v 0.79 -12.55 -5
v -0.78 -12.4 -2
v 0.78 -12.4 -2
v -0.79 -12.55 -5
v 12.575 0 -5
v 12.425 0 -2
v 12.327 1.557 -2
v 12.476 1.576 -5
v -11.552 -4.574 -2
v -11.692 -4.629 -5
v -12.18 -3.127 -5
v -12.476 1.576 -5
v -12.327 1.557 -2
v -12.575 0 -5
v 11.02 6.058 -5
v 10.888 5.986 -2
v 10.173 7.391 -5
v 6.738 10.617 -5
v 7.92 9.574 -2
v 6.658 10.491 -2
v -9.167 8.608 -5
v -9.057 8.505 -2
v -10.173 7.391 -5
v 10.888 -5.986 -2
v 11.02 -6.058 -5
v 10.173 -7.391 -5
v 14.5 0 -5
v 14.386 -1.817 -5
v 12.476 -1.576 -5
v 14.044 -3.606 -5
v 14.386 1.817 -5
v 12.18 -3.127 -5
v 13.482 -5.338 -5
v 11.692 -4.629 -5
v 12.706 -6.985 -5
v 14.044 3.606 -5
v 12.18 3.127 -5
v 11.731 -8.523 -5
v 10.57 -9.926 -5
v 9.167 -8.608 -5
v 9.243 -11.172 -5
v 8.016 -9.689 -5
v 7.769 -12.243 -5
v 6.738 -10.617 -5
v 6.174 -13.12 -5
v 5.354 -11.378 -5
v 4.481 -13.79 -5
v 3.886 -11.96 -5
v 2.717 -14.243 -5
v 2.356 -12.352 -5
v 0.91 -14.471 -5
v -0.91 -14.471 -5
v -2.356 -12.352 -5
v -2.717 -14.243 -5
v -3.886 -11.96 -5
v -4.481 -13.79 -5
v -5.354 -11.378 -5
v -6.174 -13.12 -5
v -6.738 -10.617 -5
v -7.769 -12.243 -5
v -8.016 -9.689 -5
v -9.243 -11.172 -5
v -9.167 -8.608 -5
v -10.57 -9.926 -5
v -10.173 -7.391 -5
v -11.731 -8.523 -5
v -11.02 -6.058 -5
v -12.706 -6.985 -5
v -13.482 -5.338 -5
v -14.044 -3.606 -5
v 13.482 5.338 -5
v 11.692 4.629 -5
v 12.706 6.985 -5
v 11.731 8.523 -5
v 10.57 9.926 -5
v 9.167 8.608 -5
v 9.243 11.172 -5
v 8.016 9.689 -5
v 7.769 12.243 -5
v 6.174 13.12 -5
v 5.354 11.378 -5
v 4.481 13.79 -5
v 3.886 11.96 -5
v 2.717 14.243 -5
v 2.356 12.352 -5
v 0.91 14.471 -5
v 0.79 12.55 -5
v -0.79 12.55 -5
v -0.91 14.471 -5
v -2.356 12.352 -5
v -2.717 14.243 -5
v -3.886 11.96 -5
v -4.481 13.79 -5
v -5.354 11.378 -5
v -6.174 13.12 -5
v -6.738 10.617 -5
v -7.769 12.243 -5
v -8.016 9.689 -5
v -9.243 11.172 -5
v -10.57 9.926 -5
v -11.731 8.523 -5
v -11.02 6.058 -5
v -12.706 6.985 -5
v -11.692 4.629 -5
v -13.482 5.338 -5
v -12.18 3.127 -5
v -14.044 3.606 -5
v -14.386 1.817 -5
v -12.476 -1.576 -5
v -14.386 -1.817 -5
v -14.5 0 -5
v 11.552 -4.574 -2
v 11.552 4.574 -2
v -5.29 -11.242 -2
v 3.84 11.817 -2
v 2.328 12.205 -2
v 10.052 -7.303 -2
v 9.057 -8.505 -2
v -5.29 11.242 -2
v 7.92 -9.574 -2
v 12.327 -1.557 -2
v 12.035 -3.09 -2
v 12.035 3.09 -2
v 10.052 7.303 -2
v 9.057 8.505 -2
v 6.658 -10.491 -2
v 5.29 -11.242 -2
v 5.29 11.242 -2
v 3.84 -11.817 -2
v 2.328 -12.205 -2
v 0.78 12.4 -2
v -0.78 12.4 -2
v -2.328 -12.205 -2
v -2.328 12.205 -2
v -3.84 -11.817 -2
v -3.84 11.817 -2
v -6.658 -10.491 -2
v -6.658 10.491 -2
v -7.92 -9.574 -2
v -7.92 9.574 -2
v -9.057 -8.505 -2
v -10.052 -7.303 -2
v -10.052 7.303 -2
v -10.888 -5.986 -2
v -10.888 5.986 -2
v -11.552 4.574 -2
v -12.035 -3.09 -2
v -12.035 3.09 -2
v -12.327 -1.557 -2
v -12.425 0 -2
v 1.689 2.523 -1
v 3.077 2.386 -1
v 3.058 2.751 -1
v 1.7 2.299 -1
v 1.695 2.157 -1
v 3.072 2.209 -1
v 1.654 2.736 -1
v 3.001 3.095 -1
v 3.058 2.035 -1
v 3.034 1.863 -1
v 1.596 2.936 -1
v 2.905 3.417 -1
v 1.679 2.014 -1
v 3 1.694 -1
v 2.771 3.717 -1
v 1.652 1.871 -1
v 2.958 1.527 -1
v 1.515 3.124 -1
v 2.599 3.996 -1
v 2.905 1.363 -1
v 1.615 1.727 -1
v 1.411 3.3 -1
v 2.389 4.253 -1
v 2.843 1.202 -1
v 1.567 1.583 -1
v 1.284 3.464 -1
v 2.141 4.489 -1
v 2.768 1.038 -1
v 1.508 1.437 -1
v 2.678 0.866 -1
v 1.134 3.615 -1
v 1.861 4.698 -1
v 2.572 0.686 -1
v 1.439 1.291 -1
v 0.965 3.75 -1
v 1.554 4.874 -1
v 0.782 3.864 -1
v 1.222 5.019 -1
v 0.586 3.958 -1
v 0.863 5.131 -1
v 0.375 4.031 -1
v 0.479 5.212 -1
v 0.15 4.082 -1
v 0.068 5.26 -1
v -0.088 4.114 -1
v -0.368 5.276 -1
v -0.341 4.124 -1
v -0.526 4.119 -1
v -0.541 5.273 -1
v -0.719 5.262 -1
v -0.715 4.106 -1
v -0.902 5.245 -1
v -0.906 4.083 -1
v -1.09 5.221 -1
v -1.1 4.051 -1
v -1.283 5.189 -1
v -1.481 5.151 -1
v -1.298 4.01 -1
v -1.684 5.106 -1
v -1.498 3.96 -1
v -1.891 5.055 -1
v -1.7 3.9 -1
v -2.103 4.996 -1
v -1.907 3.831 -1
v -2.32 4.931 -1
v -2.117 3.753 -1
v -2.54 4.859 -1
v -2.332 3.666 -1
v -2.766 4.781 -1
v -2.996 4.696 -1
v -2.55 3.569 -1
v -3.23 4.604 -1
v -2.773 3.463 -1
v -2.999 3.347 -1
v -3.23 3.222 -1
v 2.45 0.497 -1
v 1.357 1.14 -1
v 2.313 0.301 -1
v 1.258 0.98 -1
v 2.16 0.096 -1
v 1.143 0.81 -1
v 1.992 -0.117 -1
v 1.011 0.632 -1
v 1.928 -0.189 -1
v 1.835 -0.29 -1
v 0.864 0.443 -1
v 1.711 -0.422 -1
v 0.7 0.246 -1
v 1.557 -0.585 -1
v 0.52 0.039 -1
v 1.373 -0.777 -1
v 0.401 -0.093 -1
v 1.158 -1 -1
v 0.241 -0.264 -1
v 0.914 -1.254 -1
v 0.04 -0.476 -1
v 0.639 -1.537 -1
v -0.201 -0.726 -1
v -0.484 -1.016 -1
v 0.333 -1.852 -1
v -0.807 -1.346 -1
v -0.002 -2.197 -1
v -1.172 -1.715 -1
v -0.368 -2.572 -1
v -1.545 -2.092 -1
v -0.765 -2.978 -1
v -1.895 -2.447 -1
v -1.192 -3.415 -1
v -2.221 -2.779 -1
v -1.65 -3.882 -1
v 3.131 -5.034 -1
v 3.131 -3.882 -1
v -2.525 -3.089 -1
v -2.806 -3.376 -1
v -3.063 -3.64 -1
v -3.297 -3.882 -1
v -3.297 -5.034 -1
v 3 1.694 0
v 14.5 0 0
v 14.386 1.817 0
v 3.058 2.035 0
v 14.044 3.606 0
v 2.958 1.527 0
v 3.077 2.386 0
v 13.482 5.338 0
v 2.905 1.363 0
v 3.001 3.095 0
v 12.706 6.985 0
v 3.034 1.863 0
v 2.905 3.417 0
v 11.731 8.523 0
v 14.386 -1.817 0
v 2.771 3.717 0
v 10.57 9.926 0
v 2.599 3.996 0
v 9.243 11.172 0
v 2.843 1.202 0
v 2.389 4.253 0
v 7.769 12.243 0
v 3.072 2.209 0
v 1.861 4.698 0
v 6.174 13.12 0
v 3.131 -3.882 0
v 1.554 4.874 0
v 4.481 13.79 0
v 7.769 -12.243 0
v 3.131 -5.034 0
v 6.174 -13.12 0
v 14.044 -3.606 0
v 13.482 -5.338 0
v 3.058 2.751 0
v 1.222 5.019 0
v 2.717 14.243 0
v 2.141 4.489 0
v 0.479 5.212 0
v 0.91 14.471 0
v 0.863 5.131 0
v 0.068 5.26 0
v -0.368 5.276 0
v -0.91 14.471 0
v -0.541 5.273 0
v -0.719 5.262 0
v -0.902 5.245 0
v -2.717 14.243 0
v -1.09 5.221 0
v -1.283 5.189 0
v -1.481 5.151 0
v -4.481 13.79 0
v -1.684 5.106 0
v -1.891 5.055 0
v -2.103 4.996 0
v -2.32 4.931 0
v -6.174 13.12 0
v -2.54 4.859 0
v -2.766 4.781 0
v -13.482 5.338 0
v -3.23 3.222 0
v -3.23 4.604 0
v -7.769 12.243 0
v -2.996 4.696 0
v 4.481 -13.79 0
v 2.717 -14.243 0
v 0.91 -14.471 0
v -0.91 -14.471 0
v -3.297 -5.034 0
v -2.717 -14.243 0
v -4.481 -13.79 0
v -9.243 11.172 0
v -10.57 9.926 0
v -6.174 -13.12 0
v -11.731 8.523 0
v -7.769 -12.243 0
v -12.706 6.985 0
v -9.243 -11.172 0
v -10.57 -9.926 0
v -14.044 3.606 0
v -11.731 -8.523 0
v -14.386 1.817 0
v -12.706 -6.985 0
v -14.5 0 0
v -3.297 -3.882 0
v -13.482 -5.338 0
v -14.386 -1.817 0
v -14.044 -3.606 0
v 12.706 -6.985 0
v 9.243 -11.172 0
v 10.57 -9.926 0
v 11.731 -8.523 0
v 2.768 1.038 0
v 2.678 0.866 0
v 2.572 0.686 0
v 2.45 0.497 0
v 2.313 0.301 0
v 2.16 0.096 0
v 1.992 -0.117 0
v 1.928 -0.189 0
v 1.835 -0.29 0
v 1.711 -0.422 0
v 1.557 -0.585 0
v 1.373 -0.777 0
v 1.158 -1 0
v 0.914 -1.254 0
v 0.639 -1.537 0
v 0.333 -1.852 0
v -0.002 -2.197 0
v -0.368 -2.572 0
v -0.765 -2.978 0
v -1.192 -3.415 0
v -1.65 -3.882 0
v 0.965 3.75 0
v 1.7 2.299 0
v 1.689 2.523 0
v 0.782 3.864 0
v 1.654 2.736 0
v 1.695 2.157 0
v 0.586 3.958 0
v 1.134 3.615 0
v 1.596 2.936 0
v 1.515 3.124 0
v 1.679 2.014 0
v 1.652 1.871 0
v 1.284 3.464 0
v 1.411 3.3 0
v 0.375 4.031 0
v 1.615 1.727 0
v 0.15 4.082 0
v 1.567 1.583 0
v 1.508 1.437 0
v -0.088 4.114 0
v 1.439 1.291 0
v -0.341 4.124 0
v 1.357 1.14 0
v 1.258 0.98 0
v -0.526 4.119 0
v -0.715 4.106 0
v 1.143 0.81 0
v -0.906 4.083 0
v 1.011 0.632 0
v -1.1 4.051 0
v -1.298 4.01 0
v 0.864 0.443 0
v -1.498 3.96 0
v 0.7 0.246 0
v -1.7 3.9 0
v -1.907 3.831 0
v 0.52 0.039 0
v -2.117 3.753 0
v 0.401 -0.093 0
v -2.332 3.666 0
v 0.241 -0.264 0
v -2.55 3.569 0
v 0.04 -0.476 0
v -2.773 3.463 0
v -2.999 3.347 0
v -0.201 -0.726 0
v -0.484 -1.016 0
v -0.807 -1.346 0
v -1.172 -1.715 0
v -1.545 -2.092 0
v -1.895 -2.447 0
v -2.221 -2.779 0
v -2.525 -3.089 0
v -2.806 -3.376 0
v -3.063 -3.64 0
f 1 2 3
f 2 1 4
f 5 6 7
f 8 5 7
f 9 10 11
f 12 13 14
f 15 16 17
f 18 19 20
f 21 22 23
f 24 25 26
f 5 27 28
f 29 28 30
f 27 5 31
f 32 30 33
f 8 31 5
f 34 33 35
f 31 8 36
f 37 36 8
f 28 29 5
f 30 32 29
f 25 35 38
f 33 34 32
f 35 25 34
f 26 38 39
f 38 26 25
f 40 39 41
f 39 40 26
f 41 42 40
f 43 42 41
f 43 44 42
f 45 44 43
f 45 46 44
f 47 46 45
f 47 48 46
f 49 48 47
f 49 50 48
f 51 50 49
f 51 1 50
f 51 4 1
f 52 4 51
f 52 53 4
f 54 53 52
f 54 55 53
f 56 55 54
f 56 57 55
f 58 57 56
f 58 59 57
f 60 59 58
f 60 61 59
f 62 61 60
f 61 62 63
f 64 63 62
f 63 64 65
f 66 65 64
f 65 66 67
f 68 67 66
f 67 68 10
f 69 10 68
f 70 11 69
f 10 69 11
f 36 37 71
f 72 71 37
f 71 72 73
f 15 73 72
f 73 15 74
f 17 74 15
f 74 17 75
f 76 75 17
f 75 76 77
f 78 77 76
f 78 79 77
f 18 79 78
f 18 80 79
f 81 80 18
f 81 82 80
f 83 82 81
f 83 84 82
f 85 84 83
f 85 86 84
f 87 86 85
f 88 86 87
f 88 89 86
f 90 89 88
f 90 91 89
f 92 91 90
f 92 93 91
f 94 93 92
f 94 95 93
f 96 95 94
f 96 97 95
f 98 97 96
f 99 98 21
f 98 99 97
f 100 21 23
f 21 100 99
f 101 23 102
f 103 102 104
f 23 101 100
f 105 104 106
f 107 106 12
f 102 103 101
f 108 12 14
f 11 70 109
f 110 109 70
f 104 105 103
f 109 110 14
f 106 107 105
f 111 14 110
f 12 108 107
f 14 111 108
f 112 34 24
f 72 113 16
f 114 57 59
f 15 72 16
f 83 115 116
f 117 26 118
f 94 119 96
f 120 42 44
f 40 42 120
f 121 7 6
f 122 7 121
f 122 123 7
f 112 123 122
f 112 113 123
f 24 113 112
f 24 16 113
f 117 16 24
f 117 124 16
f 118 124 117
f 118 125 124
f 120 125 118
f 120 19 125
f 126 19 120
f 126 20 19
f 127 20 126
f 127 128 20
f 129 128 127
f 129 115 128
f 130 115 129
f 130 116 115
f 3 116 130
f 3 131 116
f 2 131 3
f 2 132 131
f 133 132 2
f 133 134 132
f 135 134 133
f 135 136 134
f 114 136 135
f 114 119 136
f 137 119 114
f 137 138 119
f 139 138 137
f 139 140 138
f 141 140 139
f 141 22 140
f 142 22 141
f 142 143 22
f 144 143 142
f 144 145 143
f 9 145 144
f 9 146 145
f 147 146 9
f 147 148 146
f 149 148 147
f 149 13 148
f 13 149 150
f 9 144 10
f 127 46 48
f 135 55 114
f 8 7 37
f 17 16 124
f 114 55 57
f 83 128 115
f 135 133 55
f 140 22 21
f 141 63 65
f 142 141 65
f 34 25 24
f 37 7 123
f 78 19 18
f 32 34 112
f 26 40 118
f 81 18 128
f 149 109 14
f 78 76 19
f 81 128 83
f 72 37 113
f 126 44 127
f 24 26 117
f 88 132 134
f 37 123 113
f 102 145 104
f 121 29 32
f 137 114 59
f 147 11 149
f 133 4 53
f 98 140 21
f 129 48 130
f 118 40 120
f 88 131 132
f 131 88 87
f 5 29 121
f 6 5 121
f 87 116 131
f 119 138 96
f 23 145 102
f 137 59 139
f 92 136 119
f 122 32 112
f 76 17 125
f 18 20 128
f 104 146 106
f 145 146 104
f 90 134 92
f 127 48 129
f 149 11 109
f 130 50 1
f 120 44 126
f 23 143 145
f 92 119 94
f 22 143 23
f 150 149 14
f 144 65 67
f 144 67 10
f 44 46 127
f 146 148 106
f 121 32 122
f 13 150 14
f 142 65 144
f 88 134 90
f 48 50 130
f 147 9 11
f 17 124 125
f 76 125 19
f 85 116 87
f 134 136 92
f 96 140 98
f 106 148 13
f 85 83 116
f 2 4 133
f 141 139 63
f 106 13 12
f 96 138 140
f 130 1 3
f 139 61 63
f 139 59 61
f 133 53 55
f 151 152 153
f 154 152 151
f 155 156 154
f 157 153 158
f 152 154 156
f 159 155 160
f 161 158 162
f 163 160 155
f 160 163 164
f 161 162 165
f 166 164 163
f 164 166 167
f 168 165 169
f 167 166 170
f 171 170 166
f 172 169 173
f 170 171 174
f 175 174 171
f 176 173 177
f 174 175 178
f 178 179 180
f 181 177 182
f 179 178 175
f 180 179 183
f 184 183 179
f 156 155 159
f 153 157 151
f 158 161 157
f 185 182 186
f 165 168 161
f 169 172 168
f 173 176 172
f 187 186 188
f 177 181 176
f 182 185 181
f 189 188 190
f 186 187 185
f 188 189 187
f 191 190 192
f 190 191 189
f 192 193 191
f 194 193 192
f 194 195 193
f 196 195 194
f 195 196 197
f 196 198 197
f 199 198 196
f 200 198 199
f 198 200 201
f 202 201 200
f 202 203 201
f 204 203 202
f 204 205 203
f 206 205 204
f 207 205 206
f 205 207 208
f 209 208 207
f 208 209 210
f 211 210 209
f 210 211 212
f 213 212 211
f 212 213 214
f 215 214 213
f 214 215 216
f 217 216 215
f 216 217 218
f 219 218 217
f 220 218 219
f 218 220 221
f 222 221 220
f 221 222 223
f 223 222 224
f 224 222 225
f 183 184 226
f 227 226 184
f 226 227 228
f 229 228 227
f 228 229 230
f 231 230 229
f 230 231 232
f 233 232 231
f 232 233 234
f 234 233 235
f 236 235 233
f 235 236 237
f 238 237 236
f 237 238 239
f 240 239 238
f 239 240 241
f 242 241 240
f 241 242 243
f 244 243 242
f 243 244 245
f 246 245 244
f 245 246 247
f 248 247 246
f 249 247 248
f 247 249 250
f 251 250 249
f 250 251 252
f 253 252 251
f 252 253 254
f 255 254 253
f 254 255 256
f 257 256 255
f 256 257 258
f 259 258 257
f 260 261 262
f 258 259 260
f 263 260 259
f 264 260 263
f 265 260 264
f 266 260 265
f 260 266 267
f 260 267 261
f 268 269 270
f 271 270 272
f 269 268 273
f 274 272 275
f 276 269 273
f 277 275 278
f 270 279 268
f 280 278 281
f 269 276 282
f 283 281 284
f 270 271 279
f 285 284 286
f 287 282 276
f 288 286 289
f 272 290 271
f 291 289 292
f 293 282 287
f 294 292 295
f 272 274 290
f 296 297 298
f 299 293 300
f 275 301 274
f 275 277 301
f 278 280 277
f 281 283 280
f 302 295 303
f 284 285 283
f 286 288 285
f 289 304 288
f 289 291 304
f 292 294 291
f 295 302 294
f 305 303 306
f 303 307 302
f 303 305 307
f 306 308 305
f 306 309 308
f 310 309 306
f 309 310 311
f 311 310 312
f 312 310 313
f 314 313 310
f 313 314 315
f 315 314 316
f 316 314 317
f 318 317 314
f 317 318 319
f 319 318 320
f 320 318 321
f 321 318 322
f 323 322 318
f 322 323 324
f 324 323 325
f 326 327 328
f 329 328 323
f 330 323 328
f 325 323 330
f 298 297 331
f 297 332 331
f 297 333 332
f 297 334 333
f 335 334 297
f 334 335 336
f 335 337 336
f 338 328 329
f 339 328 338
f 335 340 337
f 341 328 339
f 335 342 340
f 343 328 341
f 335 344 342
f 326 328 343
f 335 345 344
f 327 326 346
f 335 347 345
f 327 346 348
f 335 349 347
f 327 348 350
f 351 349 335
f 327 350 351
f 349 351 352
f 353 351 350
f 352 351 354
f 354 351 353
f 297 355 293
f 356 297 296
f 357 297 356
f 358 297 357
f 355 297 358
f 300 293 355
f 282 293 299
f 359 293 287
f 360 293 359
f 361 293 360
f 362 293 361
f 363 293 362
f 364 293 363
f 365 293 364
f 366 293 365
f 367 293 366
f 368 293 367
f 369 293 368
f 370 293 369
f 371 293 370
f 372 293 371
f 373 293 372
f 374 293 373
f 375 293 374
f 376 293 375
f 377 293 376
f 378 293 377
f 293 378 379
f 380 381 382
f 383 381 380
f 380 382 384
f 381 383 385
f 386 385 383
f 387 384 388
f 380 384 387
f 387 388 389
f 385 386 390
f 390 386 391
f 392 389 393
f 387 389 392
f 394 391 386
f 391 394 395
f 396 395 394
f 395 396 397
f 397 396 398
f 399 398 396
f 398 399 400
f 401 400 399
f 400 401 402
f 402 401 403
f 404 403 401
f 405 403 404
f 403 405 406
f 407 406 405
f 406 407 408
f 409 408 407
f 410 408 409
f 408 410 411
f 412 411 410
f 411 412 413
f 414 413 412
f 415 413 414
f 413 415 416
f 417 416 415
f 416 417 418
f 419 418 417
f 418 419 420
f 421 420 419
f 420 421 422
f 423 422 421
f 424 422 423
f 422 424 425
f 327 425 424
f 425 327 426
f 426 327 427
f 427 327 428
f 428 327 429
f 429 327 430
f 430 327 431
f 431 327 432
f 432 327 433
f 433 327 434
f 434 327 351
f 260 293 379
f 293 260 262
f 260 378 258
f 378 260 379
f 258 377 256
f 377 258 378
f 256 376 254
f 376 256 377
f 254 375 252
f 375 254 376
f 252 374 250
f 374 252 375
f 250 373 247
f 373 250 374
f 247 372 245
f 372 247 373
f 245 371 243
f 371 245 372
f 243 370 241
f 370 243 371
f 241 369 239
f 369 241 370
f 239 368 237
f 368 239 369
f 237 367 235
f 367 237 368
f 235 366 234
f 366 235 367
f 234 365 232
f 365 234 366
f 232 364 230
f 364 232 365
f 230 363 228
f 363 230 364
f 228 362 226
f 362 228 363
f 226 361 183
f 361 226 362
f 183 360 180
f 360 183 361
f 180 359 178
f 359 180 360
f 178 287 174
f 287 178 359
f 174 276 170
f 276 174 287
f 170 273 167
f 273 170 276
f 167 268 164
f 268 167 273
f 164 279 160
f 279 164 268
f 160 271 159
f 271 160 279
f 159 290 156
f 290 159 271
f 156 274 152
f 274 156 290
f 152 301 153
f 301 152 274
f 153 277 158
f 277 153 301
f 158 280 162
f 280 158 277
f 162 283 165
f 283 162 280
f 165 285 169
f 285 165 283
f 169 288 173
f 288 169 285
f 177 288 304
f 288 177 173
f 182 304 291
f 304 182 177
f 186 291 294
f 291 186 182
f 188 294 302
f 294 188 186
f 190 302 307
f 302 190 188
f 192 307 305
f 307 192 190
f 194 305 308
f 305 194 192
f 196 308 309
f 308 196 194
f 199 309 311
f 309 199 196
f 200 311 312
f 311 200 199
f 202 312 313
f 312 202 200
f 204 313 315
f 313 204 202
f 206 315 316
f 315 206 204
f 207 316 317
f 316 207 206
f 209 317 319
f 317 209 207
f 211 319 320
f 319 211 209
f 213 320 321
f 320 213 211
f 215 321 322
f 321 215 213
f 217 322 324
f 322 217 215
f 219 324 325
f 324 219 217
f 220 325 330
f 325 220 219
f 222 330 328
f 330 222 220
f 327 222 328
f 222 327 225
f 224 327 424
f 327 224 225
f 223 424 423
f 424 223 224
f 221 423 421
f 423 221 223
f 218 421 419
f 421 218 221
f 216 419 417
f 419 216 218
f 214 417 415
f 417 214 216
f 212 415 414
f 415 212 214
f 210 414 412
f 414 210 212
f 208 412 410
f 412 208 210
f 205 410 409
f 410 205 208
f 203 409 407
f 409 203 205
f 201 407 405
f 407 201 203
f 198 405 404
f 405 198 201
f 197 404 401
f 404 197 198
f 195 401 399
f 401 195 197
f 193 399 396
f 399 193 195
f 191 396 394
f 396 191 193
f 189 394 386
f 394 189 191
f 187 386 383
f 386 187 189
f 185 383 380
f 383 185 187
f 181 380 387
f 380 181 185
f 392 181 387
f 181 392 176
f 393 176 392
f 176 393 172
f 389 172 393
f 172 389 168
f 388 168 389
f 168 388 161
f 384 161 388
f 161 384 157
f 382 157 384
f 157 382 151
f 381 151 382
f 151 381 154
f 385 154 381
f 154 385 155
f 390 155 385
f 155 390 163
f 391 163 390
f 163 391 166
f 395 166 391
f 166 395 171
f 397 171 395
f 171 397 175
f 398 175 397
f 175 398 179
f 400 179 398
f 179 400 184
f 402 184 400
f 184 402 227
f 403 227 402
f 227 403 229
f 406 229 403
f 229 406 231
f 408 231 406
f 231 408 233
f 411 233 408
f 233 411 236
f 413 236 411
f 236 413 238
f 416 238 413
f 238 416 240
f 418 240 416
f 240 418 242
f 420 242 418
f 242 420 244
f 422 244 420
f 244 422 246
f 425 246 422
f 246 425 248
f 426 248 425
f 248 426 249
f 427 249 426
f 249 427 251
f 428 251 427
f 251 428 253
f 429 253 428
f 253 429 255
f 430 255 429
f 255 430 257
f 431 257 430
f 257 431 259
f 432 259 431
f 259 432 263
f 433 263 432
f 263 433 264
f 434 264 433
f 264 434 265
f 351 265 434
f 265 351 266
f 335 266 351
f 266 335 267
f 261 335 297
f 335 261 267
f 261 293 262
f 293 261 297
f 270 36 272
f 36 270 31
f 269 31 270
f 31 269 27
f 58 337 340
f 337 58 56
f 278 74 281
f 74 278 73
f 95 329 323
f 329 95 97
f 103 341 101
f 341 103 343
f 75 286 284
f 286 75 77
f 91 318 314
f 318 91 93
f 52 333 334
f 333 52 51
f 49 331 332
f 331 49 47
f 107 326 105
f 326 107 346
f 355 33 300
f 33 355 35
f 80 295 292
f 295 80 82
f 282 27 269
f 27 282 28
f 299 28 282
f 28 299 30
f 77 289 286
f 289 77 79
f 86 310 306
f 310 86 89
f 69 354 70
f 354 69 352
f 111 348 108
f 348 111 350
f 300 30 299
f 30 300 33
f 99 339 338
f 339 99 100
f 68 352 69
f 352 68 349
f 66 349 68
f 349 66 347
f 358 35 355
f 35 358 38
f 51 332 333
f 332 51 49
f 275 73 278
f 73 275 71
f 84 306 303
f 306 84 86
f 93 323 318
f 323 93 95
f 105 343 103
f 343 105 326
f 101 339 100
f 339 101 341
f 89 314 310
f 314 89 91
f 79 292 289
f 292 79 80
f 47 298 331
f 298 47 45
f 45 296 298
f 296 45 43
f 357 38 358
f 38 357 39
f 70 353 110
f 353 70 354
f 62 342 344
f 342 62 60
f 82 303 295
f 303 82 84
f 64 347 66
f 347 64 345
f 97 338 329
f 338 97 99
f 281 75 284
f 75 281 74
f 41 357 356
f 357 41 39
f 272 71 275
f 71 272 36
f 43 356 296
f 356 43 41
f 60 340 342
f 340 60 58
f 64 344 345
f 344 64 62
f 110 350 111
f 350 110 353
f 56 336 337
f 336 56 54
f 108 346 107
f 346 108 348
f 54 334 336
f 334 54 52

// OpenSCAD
$fn = 50;


difference() {
	union() {
		translate(v = [0, 0, -5.0000000000]) {
			cylinder(h = 5, r = 14.5000000000);
		}
	}
	union() {
		#translate(v = [0, 0, -5.0000000000]) {
			cylinder(h = 3, r1 = 12.5750000000, r2 = 12.4250000000);
		}
		translate(v = [0, 0, -1]) {
			linear_extrude(height = 1) {
				text(font = "Impact", halign = "center", size = 10, text = "2", valign = "center");
			}
		}
	}
}
